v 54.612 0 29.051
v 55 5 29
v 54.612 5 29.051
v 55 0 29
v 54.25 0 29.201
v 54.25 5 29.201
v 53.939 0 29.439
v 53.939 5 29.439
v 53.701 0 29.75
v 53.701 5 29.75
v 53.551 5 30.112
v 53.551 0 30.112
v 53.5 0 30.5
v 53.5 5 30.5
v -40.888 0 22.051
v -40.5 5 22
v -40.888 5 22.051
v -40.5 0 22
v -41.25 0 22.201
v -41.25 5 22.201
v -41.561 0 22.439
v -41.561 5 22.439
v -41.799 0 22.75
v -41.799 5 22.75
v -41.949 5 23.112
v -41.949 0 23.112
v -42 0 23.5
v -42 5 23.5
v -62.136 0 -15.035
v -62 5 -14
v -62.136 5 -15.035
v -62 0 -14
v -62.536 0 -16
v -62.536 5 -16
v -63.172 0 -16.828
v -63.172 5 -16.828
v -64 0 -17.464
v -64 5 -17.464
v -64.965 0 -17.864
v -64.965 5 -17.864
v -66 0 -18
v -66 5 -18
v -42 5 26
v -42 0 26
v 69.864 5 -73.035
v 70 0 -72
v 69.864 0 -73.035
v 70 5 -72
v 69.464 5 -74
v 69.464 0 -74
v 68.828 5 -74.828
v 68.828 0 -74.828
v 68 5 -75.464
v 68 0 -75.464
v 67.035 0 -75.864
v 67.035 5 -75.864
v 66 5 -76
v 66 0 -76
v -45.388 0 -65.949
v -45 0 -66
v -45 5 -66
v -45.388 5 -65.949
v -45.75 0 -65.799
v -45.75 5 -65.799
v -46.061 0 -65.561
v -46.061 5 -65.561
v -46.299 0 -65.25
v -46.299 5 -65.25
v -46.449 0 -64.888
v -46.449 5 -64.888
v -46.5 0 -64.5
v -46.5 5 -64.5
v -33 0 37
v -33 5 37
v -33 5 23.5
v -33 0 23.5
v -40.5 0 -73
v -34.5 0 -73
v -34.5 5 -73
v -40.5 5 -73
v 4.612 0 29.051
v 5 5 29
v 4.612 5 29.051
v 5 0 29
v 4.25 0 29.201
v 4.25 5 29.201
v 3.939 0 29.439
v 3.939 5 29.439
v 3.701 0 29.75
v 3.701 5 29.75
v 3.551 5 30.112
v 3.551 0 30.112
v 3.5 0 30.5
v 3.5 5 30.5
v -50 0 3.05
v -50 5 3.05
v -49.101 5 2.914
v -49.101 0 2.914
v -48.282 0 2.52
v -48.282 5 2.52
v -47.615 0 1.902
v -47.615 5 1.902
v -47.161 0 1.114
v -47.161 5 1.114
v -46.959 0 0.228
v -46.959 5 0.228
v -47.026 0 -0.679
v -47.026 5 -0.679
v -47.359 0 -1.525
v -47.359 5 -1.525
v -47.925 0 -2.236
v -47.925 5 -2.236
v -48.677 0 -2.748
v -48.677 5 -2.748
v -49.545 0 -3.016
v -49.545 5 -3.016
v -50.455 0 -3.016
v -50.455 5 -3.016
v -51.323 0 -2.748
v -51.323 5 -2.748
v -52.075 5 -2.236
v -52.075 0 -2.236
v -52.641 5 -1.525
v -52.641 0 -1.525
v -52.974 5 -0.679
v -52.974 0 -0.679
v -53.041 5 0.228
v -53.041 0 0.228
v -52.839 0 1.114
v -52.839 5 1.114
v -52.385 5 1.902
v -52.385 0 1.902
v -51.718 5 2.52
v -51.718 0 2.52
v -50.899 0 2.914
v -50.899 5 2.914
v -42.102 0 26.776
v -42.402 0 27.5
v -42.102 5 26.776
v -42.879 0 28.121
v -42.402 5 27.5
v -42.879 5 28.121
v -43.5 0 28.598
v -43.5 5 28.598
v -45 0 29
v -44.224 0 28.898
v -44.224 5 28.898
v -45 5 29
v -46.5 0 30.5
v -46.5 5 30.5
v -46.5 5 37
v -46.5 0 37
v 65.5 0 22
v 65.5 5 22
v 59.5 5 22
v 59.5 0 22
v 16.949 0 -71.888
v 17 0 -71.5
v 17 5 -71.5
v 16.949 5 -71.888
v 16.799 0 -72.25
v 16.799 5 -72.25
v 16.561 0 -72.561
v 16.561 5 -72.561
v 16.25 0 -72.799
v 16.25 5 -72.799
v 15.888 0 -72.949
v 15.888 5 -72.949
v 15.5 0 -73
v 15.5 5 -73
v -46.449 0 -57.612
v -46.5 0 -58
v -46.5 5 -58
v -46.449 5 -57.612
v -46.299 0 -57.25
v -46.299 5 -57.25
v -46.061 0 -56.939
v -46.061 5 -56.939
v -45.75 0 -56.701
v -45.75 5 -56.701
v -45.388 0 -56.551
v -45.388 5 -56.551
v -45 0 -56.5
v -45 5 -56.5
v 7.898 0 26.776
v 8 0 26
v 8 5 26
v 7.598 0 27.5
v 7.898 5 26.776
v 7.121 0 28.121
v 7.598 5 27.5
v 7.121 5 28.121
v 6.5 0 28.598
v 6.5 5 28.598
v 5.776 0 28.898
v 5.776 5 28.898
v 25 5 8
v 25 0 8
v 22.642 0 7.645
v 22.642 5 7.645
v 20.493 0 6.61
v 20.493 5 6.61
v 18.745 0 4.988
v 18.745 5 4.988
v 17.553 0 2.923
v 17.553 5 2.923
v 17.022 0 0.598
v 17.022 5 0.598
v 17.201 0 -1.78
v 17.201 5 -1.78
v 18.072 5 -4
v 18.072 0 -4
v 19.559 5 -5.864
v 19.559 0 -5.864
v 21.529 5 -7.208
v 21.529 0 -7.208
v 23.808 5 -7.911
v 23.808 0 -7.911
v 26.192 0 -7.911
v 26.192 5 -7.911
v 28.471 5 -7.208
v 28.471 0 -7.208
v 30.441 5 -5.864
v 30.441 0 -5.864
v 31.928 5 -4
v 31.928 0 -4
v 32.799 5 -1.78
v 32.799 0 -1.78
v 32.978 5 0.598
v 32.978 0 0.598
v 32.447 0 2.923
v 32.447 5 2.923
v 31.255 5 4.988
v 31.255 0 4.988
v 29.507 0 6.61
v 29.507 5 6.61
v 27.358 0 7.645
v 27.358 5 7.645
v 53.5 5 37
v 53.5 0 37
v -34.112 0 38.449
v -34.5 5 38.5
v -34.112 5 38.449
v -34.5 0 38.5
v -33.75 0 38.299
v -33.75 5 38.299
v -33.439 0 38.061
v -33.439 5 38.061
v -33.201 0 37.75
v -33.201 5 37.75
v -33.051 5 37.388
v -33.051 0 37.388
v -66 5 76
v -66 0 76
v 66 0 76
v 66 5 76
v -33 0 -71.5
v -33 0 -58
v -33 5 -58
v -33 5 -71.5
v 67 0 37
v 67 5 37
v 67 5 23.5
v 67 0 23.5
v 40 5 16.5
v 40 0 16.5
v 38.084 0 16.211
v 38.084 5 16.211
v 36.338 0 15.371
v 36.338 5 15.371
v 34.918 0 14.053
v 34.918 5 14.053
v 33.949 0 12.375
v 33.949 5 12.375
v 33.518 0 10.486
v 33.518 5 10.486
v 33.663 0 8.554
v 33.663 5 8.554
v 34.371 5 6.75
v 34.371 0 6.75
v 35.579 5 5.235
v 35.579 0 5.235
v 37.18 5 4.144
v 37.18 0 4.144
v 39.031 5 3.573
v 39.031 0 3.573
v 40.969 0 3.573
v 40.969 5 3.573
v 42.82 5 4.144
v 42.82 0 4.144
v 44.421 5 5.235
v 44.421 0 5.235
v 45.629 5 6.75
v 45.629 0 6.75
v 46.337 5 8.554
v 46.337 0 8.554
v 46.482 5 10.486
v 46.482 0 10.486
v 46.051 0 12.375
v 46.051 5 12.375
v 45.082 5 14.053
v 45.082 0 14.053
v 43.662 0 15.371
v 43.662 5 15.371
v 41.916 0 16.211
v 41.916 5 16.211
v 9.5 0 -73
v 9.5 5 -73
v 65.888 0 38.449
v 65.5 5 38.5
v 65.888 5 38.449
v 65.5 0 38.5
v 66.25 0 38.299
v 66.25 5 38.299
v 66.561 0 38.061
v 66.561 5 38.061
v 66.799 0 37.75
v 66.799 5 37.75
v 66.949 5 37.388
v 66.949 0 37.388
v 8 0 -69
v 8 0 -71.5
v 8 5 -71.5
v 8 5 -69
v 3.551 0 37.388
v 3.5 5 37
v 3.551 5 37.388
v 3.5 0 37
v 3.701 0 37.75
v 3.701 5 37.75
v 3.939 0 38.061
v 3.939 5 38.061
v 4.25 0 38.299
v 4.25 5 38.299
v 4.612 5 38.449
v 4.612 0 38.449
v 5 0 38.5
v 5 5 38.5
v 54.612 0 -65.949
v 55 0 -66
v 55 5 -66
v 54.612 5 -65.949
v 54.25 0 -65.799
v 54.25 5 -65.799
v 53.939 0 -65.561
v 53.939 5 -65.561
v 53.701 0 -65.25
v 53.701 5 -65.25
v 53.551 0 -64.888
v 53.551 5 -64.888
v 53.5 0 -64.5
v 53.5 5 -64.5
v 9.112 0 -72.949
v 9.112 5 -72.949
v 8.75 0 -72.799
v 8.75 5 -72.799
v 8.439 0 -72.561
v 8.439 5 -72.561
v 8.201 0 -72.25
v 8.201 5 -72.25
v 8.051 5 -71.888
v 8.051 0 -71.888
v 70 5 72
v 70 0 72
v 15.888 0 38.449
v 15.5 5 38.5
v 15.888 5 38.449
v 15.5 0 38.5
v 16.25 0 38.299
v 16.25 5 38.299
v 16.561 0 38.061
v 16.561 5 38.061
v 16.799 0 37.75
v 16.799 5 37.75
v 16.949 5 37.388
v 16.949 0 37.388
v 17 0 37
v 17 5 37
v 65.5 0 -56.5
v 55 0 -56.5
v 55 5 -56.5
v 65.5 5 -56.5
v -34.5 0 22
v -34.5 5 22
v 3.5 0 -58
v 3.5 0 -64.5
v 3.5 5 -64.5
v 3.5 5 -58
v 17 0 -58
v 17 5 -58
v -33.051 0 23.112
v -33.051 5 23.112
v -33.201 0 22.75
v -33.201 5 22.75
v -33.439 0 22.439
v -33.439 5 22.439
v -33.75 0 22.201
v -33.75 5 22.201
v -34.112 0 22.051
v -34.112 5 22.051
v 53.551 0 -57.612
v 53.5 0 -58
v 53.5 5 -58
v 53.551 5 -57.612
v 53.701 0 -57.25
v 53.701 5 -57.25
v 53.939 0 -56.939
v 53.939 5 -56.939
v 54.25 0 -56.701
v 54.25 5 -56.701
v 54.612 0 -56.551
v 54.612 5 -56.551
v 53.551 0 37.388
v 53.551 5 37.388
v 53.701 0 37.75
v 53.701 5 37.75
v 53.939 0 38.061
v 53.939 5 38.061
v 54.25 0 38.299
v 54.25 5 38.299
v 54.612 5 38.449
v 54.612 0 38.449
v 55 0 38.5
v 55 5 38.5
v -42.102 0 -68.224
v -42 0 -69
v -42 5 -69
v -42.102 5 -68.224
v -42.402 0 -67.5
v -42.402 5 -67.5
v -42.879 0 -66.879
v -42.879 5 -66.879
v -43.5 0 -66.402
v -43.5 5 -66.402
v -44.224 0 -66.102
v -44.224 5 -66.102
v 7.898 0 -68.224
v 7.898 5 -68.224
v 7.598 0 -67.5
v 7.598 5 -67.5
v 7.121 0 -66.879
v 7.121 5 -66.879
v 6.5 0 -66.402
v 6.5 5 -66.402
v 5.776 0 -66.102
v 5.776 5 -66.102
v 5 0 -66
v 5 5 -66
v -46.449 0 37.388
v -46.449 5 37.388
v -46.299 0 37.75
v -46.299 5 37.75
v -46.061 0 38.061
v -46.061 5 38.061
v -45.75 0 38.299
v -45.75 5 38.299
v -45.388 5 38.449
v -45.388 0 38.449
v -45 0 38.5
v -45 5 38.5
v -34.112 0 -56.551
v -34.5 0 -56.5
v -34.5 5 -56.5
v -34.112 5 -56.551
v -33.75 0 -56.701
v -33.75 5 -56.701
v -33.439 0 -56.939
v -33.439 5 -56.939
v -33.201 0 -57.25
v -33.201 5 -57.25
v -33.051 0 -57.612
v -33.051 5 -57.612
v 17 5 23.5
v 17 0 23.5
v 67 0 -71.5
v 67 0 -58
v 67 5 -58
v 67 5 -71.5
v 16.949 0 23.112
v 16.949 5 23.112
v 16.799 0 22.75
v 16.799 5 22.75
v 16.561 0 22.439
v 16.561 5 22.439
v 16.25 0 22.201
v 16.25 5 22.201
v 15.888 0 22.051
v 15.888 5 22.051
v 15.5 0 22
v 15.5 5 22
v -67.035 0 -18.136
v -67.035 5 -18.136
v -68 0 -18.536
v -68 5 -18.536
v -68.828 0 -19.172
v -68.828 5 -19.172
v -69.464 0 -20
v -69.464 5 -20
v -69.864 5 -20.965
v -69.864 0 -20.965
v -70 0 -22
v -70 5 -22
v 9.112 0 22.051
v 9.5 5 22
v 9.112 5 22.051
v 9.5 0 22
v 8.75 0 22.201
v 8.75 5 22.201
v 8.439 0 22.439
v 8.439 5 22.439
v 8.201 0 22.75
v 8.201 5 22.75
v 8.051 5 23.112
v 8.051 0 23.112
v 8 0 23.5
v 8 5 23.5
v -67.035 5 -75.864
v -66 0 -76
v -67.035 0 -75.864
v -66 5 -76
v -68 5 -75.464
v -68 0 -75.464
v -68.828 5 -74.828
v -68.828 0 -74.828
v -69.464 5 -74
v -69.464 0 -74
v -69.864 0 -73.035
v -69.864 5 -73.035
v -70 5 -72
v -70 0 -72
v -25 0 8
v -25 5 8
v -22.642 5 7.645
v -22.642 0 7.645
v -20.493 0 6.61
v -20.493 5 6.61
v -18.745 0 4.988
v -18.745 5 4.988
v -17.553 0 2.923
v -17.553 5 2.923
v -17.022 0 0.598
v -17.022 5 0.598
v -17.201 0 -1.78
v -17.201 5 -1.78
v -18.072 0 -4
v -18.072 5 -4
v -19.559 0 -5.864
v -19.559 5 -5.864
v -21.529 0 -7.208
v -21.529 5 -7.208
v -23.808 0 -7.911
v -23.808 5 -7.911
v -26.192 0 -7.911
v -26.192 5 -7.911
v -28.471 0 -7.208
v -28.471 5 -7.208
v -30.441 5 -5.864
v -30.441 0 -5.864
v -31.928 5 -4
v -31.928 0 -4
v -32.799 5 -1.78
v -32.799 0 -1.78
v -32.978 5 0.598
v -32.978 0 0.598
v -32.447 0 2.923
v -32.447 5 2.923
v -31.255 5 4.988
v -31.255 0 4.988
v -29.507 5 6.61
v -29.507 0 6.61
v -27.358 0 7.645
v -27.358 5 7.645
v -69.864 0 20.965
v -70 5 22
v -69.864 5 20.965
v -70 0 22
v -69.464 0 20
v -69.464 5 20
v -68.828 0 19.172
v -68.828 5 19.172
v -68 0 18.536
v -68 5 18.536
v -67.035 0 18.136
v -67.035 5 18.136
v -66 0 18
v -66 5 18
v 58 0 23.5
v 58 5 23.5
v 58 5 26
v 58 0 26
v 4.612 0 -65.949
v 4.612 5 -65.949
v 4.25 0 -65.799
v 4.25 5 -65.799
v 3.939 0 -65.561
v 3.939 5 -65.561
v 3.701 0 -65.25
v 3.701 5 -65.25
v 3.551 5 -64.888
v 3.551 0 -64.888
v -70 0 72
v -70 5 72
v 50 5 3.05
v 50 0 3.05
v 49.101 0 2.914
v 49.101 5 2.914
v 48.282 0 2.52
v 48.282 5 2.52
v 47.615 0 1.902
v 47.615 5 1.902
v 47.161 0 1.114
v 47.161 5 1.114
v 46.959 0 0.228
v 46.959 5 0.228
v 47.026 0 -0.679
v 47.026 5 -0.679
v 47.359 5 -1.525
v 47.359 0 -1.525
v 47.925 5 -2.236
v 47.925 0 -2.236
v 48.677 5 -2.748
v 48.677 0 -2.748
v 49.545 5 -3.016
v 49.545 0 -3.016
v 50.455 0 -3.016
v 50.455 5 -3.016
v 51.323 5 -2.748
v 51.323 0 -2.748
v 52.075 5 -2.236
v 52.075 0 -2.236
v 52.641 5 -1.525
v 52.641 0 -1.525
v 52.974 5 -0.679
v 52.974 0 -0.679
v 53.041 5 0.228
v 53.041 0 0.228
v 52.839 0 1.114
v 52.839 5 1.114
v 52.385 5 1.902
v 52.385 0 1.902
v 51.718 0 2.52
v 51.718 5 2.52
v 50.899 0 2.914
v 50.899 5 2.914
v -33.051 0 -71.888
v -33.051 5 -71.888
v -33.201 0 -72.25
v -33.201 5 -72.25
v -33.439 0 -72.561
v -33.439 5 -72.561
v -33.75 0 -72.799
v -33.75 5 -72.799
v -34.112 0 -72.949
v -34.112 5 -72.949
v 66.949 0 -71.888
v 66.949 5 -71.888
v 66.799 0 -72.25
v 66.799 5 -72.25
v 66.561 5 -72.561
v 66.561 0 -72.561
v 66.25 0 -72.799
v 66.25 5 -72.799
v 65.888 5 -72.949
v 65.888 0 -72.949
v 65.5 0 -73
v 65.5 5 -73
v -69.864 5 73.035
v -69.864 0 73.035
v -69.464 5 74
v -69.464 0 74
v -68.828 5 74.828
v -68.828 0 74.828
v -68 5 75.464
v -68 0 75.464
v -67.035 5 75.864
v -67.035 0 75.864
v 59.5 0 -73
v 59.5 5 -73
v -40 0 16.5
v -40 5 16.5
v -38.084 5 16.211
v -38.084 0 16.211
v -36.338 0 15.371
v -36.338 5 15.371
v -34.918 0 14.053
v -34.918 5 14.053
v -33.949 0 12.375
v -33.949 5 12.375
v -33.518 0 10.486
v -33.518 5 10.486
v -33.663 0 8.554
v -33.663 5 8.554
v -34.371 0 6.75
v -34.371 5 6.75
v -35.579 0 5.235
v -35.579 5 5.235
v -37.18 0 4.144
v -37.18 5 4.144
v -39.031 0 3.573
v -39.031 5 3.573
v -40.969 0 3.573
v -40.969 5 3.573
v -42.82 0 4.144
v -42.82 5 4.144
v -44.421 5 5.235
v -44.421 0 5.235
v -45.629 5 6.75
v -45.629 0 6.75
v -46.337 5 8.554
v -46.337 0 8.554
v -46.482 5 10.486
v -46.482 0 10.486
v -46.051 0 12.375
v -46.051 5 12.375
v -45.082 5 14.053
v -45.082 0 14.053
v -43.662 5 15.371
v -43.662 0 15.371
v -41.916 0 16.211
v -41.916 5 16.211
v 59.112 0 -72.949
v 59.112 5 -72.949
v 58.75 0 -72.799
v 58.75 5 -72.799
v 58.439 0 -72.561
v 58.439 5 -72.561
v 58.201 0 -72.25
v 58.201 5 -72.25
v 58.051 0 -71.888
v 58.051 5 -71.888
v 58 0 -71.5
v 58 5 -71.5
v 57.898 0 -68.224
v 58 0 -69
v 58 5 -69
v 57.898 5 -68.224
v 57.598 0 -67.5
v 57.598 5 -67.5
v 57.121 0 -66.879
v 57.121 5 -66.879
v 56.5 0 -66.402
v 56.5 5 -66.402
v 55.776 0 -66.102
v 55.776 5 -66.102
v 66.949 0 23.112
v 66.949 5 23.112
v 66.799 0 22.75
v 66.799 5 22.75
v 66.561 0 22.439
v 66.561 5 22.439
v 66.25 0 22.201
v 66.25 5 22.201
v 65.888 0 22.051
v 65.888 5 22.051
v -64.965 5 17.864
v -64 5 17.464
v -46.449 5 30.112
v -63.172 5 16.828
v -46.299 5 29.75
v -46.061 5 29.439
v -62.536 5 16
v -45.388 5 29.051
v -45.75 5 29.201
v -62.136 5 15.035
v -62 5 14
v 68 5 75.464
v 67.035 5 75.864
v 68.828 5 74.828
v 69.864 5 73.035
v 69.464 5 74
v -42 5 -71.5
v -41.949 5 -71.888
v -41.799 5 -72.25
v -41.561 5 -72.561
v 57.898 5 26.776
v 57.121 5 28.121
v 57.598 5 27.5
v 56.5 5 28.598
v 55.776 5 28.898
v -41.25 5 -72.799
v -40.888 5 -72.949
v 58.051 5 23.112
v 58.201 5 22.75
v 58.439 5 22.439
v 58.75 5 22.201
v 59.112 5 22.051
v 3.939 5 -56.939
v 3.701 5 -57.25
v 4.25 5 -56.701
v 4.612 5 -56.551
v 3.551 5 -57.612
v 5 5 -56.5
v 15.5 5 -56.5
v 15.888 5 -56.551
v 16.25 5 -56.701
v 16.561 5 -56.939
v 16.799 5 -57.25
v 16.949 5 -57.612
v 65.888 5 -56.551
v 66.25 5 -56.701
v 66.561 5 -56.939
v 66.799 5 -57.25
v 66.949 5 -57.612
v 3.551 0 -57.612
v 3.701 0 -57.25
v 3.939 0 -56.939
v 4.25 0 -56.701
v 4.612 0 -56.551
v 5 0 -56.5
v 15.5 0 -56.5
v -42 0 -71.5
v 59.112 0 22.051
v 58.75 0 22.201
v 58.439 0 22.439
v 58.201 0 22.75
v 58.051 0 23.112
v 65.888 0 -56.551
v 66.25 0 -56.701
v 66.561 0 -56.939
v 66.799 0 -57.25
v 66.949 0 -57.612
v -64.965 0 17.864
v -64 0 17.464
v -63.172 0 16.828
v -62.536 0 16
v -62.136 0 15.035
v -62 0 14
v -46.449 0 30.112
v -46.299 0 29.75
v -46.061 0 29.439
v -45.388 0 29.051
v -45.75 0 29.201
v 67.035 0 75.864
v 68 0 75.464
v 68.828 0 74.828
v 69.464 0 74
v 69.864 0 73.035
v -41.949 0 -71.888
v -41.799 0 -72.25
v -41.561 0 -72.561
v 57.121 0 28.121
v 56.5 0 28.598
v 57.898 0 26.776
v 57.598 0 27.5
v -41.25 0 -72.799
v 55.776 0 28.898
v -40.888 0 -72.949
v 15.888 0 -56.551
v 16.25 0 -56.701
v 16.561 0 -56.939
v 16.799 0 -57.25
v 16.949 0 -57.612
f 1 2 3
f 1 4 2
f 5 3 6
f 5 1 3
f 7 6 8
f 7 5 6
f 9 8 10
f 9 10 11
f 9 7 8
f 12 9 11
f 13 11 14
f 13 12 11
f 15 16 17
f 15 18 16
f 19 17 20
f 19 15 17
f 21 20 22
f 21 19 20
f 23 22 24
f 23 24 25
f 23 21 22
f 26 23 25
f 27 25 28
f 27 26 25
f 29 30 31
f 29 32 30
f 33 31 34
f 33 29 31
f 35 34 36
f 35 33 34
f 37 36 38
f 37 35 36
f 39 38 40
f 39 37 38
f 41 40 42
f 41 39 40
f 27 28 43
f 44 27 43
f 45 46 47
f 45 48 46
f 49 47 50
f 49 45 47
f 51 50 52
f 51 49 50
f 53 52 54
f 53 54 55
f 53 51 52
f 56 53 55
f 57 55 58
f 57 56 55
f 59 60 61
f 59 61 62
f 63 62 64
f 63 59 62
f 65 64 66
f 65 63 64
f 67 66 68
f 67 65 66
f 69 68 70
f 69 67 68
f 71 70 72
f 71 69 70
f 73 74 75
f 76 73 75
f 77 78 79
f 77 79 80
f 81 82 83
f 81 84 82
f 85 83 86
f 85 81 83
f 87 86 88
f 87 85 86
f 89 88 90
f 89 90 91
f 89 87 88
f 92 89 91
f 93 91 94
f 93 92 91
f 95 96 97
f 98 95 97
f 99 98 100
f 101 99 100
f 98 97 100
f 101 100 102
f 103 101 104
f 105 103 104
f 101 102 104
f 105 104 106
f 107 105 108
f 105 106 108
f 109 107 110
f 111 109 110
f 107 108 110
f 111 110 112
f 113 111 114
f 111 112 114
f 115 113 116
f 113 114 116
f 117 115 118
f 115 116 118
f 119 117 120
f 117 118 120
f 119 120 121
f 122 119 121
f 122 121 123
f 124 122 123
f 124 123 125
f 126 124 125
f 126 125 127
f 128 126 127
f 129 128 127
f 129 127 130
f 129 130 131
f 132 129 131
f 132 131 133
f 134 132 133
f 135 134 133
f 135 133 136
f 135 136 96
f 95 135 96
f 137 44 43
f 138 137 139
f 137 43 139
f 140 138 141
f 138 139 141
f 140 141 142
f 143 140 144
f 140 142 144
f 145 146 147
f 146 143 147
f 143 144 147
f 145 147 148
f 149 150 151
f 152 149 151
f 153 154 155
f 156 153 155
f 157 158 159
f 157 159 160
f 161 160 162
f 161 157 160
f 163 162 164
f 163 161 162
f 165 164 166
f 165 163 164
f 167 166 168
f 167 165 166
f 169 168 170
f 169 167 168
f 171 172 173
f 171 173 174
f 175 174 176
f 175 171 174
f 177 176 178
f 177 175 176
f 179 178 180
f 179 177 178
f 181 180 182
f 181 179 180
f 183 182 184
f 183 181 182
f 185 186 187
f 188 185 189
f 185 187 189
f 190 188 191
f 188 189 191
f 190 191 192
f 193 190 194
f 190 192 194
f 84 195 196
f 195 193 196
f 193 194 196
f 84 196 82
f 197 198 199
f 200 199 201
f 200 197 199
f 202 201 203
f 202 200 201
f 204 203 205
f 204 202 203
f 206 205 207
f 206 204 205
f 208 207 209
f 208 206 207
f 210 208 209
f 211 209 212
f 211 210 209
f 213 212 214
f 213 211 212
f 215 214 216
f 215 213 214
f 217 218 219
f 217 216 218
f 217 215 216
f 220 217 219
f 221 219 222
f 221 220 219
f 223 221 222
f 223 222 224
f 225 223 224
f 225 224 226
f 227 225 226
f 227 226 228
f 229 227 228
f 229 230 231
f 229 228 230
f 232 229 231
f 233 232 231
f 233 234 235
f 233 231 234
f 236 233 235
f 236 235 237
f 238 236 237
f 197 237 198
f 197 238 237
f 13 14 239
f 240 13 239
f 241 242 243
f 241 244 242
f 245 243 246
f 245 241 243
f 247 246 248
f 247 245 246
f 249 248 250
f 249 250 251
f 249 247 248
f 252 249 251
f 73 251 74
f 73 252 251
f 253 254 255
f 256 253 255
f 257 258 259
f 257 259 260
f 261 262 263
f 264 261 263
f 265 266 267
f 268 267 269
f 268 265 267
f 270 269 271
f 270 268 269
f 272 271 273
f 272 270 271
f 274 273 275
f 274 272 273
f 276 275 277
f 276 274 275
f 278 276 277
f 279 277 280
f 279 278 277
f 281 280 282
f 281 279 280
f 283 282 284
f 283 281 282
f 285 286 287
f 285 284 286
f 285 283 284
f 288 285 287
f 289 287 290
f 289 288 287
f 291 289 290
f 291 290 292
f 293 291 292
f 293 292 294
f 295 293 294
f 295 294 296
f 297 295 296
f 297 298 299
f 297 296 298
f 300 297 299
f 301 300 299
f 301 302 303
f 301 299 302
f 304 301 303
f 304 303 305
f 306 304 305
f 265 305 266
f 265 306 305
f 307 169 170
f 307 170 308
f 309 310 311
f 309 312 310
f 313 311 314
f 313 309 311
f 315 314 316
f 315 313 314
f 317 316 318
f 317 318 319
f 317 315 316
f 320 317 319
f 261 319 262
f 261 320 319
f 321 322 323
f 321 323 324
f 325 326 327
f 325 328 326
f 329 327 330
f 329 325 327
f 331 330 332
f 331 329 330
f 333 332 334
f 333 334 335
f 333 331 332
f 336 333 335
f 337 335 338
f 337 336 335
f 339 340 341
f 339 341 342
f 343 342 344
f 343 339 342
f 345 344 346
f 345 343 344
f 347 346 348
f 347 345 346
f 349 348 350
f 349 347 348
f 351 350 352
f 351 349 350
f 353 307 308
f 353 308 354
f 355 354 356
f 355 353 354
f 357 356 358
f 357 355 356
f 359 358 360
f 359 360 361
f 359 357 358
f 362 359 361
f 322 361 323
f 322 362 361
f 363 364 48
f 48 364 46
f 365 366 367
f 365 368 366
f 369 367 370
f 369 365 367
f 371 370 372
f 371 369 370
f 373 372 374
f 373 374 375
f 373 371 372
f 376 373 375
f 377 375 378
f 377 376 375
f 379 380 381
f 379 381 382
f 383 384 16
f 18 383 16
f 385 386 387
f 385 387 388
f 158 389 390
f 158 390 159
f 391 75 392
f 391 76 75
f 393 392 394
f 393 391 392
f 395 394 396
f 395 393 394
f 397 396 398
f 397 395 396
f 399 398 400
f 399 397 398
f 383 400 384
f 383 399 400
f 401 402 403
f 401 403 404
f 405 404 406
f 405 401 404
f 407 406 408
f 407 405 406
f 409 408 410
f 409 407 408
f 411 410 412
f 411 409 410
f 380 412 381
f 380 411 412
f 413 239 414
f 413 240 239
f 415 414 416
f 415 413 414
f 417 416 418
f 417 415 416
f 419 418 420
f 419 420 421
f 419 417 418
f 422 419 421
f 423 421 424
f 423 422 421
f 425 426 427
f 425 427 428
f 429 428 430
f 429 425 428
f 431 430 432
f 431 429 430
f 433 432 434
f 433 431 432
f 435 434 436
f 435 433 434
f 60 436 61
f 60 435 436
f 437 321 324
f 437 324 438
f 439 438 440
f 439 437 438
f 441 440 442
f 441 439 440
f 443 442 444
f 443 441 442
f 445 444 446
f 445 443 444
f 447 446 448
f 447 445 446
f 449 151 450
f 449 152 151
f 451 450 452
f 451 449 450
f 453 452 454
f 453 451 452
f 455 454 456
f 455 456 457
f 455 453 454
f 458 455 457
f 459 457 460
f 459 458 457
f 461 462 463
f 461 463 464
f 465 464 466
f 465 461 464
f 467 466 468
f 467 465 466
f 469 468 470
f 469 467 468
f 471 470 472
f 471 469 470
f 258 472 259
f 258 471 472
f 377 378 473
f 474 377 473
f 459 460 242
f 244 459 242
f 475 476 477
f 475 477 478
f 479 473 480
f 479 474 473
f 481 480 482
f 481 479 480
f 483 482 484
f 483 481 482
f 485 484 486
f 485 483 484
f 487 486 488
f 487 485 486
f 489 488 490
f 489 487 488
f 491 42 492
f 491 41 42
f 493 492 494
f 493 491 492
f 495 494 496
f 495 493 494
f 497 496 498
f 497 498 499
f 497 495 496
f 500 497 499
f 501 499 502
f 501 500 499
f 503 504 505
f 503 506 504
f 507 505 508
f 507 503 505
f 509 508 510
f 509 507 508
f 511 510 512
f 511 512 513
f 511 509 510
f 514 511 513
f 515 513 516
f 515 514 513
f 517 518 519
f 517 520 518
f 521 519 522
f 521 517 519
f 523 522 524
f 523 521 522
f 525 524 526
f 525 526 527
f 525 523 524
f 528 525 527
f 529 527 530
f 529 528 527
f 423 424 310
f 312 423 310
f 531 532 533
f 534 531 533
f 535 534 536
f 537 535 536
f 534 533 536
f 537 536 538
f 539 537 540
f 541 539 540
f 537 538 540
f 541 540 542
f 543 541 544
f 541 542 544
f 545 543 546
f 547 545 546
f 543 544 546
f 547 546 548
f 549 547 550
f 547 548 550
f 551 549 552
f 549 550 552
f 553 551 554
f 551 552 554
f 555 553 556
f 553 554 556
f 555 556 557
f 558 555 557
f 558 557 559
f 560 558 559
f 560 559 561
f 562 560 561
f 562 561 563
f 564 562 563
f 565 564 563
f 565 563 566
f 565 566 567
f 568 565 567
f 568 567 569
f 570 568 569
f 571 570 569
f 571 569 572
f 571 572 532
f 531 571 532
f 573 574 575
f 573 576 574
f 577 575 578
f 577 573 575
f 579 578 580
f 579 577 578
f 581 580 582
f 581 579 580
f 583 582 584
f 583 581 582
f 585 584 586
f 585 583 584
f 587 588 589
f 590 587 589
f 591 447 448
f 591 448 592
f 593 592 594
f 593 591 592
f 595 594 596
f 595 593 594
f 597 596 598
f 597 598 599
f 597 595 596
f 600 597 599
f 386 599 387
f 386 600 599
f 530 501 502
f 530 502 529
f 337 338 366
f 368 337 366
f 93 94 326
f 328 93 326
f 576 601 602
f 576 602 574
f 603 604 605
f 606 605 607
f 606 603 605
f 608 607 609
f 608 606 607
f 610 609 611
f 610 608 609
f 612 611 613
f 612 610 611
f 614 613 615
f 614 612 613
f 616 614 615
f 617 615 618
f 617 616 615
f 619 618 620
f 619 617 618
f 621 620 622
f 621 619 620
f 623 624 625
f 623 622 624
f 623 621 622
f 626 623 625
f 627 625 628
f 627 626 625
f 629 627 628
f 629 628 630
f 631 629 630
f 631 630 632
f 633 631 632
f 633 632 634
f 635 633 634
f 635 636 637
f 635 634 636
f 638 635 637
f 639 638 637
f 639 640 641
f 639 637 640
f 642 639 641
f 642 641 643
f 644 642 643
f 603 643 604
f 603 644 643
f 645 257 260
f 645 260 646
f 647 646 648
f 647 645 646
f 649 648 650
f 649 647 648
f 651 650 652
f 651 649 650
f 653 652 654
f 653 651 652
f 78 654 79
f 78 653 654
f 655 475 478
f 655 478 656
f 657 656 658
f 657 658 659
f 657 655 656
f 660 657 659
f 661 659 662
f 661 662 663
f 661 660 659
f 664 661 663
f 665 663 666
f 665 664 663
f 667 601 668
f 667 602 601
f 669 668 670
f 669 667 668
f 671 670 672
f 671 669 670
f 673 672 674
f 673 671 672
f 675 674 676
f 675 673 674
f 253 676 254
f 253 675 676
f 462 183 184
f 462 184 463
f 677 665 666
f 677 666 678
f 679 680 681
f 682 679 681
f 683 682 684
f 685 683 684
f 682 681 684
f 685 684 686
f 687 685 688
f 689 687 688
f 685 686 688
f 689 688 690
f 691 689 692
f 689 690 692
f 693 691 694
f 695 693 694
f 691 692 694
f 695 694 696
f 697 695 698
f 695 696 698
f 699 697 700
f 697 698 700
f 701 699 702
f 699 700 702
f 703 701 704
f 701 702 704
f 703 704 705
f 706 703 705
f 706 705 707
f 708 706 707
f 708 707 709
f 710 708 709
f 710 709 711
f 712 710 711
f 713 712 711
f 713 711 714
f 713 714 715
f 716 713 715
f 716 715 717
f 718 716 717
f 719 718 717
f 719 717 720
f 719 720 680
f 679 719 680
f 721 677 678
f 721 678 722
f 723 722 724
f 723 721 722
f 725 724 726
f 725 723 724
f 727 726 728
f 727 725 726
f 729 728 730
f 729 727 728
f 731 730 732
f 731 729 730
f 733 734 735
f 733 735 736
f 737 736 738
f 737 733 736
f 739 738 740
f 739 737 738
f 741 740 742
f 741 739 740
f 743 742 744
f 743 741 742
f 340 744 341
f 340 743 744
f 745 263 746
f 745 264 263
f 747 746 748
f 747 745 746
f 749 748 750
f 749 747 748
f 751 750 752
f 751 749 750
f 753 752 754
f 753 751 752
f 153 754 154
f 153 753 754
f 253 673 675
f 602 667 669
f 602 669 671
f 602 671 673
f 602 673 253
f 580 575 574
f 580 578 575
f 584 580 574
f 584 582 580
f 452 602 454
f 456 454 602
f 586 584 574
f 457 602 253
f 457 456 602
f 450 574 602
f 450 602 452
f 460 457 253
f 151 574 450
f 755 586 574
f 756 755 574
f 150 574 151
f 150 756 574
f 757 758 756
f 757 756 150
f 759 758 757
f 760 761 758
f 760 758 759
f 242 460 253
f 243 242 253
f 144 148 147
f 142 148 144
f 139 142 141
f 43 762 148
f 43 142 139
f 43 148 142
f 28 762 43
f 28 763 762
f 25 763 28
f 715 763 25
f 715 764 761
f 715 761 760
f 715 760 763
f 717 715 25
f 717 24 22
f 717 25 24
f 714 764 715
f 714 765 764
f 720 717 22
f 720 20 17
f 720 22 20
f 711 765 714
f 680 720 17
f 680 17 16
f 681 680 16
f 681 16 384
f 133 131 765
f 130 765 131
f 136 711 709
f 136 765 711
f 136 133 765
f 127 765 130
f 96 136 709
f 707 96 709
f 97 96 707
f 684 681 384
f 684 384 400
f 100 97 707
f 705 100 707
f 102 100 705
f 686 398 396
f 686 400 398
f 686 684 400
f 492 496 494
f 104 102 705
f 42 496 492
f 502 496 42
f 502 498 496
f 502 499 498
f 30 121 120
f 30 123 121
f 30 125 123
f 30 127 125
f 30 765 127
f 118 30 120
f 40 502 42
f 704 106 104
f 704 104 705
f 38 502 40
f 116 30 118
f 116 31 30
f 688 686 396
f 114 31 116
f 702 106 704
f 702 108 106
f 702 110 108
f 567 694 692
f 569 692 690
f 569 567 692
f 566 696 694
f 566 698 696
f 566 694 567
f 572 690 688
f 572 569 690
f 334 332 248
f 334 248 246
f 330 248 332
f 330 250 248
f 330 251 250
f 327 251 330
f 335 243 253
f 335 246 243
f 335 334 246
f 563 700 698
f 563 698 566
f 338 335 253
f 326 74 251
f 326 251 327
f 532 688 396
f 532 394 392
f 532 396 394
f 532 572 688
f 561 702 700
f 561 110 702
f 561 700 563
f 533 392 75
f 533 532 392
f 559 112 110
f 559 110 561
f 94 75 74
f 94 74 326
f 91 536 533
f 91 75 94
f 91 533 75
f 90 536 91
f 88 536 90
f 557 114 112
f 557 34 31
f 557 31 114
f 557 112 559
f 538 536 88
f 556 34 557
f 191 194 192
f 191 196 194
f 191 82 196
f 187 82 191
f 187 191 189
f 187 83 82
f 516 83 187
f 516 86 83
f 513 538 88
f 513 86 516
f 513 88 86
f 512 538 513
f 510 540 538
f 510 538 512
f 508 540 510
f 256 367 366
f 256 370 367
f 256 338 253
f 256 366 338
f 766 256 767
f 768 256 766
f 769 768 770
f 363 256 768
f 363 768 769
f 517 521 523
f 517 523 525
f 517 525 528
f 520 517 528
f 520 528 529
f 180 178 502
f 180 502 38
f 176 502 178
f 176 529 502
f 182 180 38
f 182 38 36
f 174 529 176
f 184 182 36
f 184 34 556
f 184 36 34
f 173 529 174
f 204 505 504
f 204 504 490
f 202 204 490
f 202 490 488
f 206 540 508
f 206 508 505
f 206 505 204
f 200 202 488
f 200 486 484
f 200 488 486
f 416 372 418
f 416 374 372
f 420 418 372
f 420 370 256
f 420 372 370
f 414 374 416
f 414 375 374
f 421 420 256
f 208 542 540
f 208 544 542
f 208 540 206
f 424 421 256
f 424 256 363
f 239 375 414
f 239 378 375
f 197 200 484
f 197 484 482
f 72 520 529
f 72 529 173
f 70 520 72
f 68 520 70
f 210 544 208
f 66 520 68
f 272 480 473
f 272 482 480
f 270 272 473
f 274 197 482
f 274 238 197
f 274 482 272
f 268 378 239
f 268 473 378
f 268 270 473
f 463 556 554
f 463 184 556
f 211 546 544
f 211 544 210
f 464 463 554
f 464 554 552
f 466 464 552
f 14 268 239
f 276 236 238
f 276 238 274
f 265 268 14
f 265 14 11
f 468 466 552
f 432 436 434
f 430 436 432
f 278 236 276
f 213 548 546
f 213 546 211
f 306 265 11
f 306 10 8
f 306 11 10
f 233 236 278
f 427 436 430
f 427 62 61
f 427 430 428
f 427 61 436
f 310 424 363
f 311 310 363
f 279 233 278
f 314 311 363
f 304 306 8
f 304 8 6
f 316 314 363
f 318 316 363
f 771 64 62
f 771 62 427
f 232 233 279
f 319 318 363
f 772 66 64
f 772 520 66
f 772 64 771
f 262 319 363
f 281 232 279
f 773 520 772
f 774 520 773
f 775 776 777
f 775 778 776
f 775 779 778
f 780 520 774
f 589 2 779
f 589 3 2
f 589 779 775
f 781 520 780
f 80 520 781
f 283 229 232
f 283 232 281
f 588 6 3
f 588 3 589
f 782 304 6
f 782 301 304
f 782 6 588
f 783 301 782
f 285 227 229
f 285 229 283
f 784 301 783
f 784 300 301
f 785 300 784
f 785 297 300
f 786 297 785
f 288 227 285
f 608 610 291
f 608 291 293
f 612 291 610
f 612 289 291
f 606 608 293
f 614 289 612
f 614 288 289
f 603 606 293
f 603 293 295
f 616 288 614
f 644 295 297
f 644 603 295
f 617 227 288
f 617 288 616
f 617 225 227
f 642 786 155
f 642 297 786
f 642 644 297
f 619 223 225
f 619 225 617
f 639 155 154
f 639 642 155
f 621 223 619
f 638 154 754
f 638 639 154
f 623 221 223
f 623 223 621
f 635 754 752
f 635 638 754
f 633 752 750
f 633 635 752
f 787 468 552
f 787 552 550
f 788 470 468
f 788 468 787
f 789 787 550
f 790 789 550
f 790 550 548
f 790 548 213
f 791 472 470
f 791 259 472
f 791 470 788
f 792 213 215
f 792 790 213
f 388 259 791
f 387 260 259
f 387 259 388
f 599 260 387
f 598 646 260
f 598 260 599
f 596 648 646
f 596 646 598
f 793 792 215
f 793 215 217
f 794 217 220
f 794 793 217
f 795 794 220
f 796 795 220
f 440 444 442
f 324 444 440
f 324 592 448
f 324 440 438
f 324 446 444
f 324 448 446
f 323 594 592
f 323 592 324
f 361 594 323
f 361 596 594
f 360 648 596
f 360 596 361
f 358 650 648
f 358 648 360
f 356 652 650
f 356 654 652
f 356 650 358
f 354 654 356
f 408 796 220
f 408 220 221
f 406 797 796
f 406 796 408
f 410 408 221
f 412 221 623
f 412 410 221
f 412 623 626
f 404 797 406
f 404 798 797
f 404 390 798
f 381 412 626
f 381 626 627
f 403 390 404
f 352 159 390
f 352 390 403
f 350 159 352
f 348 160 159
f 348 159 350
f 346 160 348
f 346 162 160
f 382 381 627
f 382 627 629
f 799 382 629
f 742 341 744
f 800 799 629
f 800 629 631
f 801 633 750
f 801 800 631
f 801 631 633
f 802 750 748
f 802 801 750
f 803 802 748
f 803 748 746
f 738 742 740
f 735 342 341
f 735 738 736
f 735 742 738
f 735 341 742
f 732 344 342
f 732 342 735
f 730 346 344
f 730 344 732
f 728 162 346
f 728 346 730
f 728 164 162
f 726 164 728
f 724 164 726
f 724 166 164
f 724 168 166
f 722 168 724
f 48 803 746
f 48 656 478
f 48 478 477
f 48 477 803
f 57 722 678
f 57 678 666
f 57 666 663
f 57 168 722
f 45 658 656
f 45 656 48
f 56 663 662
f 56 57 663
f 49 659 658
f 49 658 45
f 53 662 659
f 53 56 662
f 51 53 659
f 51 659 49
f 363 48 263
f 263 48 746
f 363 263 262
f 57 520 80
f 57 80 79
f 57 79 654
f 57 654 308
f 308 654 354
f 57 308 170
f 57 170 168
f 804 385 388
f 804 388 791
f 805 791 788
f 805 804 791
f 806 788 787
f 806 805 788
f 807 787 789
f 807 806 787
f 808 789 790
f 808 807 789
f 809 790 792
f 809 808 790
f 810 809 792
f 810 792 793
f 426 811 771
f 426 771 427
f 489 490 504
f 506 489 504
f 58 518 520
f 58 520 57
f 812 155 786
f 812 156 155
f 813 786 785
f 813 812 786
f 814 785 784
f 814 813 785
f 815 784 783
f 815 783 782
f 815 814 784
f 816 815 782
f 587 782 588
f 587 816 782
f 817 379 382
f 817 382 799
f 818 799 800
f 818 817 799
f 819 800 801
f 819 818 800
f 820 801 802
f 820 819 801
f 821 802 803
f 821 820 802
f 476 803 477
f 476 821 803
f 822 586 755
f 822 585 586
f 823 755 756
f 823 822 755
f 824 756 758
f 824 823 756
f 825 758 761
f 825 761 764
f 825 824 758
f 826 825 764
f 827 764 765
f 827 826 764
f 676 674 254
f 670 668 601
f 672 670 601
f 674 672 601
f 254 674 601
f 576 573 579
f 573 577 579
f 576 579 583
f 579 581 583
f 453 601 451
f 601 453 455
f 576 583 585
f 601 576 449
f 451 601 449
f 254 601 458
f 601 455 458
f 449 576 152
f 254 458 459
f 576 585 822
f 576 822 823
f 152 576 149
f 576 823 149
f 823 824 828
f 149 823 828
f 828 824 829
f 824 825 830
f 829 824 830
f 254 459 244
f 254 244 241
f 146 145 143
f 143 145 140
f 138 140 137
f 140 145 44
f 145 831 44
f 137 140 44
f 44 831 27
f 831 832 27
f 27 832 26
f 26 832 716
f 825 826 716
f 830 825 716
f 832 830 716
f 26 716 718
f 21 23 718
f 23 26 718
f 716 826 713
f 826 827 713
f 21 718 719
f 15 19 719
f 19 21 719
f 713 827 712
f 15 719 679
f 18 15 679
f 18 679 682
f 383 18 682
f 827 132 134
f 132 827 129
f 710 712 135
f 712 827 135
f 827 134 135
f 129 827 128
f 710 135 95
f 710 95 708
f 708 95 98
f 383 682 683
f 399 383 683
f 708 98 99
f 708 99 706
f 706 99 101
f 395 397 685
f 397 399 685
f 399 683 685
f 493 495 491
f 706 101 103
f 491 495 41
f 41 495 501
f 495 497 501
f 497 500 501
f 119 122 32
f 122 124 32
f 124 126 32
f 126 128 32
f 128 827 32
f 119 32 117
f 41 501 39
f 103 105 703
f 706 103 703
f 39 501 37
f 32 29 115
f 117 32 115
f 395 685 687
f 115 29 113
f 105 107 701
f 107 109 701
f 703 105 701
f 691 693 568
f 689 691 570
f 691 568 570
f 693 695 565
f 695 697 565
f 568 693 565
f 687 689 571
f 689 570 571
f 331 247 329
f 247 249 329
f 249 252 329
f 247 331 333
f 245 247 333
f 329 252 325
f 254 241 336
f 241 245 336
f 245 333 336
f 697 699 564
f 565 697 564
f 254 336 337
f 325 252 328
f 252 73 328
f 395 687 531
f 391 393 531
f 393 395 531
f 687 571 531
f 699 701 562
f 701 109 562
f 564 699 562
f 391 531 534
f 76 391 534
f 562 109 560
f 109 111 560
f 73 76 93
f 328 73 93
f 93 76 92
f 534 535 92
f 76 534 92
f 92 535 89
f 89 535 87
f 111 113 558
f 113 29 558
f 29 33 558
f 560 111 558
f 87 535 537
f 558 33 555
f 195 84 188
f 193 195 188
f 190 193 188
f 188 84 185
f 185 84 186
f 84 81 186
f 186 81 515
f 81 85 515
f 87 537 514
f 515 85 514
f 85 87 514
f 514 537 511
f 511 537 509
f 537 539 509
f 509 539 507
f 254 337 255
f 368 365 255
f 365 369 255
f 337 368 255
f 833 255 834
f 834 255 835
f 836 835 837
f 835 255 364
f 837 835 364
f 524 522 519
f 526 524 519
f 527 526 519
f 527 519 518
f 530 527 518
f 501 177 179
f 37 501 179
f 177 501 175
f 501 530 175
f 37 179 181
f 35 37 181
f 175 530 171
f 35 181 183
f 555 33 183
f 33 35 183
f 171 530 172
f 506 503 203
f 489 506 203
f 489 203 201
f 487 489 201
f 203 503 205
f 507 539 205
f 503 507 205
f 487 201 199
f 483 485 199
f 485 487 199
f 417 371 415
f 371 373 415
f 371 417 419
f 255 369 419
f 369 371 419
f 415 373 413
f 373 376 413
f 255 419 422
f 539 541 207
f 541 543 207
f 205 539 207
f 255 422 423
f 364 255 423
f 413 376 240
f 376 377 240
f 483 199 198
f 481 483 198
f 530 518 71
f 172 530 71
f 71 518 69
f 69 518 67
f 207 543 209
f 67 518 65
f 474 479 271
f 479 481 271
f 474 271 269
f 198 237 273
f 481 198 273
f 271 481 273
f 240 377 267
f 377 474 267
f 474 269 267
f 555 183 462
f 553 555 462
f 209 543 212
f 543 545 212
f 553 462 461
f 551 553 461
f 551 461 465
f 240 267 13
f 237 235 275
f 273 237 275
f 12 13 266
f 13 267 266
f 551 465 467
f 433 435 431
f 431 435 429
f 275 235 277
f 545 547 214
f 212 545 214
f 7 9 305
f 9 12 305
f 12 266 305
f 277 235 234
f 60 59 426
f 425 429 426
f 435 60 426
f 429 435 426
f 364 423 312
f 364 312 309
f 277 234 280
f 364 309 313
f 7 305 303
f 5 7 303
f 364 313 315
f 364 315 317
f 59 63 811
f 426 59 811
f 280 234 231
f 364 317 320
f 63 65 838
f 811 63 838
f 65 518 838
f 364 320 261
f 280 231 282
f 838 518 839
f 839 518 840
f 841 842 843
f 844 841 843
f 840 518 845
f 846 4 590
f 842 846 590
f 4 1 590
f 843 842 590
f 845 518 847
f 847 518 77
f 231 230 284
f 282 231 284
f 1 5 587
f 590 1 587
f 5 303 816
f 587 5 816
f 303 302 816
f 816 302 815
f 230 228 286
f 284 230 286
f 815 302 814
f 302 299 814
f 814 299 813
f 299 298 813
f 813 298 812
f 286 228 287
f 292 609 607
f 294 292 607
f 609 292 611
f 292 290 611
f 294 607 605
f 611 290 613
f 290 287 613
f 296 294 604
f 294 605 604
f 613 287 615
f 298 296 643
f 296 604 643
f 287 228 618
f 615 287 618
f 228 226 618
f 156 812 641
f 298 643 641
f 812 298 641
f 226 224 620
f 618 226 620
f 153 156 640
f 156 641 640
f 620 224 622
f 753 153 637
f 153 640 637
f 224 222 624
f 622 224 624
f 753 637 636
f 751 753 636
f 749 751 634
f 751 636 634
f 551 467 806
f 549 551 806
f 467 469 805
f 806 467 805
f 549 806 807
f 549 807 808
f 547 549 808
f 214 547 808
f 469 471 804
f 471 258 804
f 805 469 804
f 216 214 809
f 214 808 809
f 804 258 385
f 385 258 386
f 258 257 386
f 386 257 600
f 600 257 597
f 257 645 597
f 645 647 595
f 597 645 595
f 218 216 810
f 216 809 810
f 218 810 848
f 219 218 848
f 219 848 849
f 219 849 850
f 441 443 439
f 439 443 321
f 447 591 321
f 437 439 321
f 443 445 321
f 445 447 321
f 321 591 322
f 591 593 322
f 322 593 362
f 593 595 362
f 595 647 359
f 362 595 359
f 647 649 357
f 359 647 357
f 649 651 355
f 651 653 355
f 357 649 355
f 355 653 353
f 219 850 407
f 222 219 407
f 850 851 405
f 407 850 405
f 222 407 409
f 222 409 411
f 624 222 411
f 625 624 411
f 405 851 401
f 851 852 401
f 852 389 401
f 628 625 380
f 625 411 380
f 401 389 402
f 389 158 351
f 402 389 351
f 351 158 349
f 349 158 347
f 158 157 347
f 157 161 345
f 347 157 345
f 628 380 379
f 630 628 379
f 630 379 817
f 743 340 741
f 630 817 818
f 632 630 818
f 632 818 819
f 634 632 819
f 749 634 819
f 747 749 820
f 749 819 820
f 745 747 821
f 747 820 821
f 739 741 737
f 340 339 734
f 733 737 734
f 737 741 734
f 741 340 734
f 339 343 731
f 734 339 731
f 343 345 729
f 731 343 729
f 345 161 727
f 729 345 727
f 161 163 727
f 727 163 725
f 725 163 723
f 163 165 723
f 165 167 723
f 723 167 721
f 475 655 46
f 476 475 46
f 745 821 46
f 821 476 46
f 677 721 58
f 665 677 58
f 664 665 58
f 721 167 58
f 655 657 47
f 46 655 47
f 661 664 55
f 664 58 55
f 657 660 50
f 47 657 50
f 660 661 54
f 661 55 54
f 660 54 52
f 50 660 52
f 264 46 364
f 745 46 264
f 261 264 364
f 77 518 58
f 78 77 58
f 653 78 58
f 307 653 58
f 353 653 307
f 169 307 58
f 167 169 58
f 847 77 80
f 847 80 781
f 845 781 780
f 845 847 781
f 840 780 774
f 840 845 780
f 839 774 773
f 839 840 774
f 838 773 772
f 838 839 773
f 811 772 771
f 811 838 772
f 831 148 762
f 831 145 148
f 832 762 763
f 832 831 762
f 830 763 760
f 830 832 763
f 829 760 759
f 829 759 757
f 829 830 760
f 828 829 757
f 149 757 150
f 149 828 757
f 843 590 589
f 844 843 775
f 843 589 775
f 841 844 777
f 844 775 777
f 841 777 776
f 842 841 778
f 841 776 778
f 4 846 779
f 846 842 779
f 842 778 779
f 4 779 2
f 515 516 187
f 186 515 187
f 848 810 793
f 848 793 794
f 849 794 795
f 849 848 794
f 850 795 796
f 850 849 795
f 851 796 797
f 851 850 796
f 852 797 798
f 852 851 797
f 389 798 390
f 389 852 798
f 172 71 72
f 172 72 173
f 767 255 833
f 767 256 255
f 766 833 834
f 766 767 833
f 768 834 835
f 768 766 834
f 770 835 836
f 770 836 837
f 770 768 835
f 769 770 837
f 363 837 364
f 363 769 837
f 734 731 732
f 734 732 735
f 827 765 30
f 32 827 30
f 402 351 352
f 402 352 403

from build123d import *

# Parameters (mm, degrees)
SKETCH1_W              = 140
SKETCH1_H              = 152
BOSS_EXTRUDE1_DEPTH    = 5
SKETCH2_R              = 3.05
SKETCH2_R_2            = 8
SKETCH2_R_3            = 6.5
CUT_EXTRUDE1_DEPTH     = 104.445637897
SKETCH4_W              = 8
SKETCH4_H              = 36
CUT_EXTRUDE3_DEPTH     = 104.445637897
CUT_EXTRUDE2_DEPTH     = 104.445637897
FILLET3_R              = 1.5
LPATTERN1_COUNT        = 3
LPATTERN1_PITCH        = 50
FILLET3_OF_LPATTERN1_R = 1.5
LPATTERN4_DEPTH        = 5
FILLET1_R              = 4


# Read off the part's stored shape, not the designer's step: LPattern4
with BuildPart() as part:
    # Sketch1 → Boss-Extrude1 (new body)
    with BuildSketch(Plane(origin=(0, 0, 0), x_dir=(1, 0, 0), z_dir=(0, 1, 0))):
        Rectangle(SKETCH1_W, SKETCH1_H)
    extrude(amount=BOSS_EXTRUDE1_DEPTH)

    # Sketch2 → Cut-Extrude1 (cut, through all)
    with BuildSketch(Plane(origin=(0, 5, 0), x_dir=(1, 0, 0), z_dir=(0, 1, 0))):
        with Locations(Location((-50, 0, 0), (0, 0, 270))):
            Circle(SKETCH2_R)
        with Locations(Location((-25, 0, 0), (0, 0, 270))):
            Circle(SKETCH2_R_2)
        with Locations(Location((-40, -10, 0), (0, 0, 270))):
            Circle(SKETCH2_R_3)
    cut_extrude1 = extrude(amount=-CUT_EXTRUDE1_DEPTH, mode=Mode.SUBTRACT)

    # Mirror1: Cut-Extrude1 across plane
    add(cut_extrude1.mirror(Plane(origin=(0, 0, 0), x_dir=(0, 0, 1), z_dir=(1, 0, 0))), mode=Mode.SUBTRACT)

    # Sketch4 → Cut-Extrude3 (cut, through all)
    with BuildSketch(Plane(origin=(0, 5, 0), x_dir=(1, 0, 0), z_dir=(0, 1, 0))):
        with Locations((-66, 0)):
            Rectangle(SKETCH4_W, SKETCH4_H)
    extrude(amount=-CUT_EXTRUDE3_DEPTH, mode=Mode.SUBTRACT)

    # Sketch3 → Cut-Extrude2 (cut, through all)
    with BuildSketch(Plane(origin=(0, 5, 0), x_dir=(1, 0, 0), z_dir=(0, 1, 0))):
        with BuildLine():
            ThreePointArc((-42, -26), (-42.878679656, -28.121320344), (-45, -29))
            Line((-45, -29), (-46.5, -29))
            Line((-46.5, -29), (-46.5, -38.5))
            Line((-46.5, -38.5), (-33, -38.5))
            Line((-33, -38.5), (-33, -22))
            Line((-33, -22), (-42, -22))
            Line((-42, -22), (-42, -26))
        make_face()
    cut_extrude2 = extrude(amount=-CUT_EXTRUDE2_DEPTH, mode=Mode.SUBTRACT)

    # Fillet3
    fillet3_edges = [part.edges().sort_by_distance(p)[0] for p in [
        (-33, 2.5, 38.5),
        (-46.5, 2.5, 38.5),
        (-46.5, 2.5, 29),
        (-33, 2.5, 22),
        (-42, 2.5, 22),
    ]]
    fillet(fillet3_edges, radius=FILLET3_R - 0.0001)  # a hair under: the kernel refuses the full size

    # LPattern1: Cut-Extrude2 ×3
    with Locations(*[(i * LPATTERN1_PITCH, 0, 0) for i in range(1, LPATTERN1_COUNT)]):
        add(cut_extrude2, mode=Mode.SUBTRACT)

    # Fillet3 of LPattern1
    fillet3_of_lpattern1_edges = [part.edges().sort_by_distance(p)[0] for p in [
        (17, 2.5, 38.5),
        (3.5, 2.5, 38.5),
        (3.5, 2.5, 29),
        (17, 2.5, 22),
        (8, 2.5, 22),
        (67, 2.5, 38.5),
        (53.5, 2.5, 38.5),
        (53.5, 2.5, 29),
        (67, 2.5, 22),
        (58, 2.5, 22),
    ]]
    fillet(fillet3_of_lpattern1_edges, radius=FILLET3_OF_LPATTERN1_R - 0.0001)  # a hair under: the kernel refuses the full size

    # LPattern4 outline → LPattern4 (cut)
    with BuildSketch(Plane(origin=(0, 0, 0), x_dir=(1, 0, 0), z_dir=(0, 1, 0))):
        with BuildLine():
            ThreePointArc((65.5, 56.5), (66.560660172, 56.939339828), (67, 58))
            Line((67, 58), (67, 71.5))
            ThreePointArc((67, 71.5), (66.560660172, 72.560660172), (65.5, 73))
            Line((65.5, 73), (59.5, 73))
            ThreePointArc((59.5, 73), (58.439339828, 72.560660172), (58, 71.5))
            Line((58, 71.5), (58, 69))
            ThreePointArc((58, 69), (57.121320344, 66.878679656), (55, 66))
            ThreePointArc((55, 66), (53.939339828, 65.560660172), (53.5, 64.5))
            Line((53.5, 64.5), (53.5, 58))
            ThreePointArc((53.5, 58), (53.939339828, 56.939339828), (55, 56.5))
            Line((55, 56.5), (65.5, 56.5))
        make_face()
        with BuildLine():
            Line((-42, 71.5), (-42, 69))
            ThreePointArc((-42, 69), (-42.878679656, 66.878679656), (-45, 66))
            ThreePointArc((-45, 66), (-46.060660172, 65.560660172), (-46.5, 64.5))
            Line((-46.5, 64.5), (-46.5, 58))
            ThreePointArc((-46.5, 58), (-46.060660172, 56.939339828), (-45, 56.5))
            Line((-45, 56.5), (-34.5, 56.5))
            ThreePointArc((-34.5, 56.5), (-33.439339828, 56.939339828), (-33, 58))
            Line((-33, 58), (-33, 71.5))
            ThreePointArc((-33, 71.5), (-33.439339828, 72.560660172), (-34.5, 73))
            Line((-34.5, 73), (-40.5, 73))
            ThreePointArc((-40.5, 73), (-41.560660172, 72.560660172), (-42, 71.5))
        make_face()
        with BuildLine():
            Line((8, 71.5), (8, 69))
            ThreePointArc((8, 69), (7.121320344, 66.878679656), (5, 66))
            ThreePointArc((5, 66), (3.939339828, 65.560660172), (3.5, 64.5))
            Line((3.5, 64.5), (3.5, 58))
            ThreePointArc((3.5, 58), (3.939339828, 56.939339828), (5, 56.5))
            Line((5, 56.5), (15.5, 56.5))
            ThreePointArc((15.5, 56.5), (16.560660172, 56.939339828), (17, 58))
            Line((17, 58), (17, 71.5))
            ThreePointArc((17, 71.5), (16.560660172, 72.560660172), (15.5, 73))
            Line((15.5, 73), (9.5, 73))
            ThreePointArc((9.5, 73), (8.439339828, 72.560660172), (8, 71.5))
        make_face()
    extrude(amount=LPATTERN4_DEPTH, mode=Mode.SUBTRACT)

    # Fillet1
    fillet1_edges = [part.edges().sort_by_distance(p)[0] for p in [
        (-70, 2.5, -76),
        (70, 2.5, -76),
        (70, 2.5, 76),
        (-70, 2.5, 76),
        (-70, 2.5, 18),
        (-62, 2.5, 18),
        (-62, 2.5, -18),
        (-70, 2.5, -18),
    ]]
    fillet(fillet1_edges, radius=FILLET1_R - 0.0001)  # a hair under: the kernel refuses the full size


solid = part.part
